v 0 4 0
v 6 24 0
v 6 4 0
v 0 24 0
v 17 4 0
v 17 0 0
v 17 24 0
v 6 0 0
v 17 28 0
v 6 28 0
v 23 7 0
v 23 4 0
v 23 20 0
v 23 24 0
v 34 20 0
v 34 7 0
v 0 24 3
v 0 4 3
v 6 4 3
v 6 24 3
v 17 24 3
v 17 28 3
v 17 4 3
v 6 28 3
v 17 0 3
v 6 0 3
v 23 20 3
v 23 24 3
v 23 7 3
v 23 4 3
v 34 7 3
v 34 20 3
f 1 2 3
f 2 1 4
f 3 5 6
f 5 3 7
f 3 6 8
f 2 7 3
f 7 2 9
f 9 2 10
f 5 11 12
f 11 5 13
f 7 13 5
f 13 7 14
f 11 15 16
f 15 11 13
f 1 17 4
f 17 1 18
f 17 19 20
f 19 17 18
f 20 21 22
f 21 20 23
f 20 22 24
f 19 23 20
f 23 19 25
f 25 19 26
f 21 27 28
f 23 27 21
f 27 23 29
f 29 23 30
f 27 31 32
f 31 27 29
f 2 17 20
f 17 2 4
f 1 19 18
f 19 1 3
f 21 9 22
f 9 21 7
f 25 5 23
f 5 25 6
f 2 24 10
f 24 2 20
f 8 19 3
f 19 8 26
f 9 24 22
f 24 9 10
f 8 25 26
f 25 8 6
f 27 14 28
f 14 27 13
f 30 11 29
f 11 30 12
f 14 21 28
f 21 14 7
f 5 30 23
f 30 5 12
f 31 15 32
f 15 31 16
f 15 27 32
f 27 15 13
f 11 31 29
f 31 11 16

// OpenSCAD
rotate([0,90,0])
union()
{
	translate([-3,4,0]) cube([3,20,7]);
	translate([-3,0,6]) cube([3,28,11]);
	translate([-3,4,16]) cube([3,20,7]);
	translate([-3,7,22]) cube([3,13,12]);
}
